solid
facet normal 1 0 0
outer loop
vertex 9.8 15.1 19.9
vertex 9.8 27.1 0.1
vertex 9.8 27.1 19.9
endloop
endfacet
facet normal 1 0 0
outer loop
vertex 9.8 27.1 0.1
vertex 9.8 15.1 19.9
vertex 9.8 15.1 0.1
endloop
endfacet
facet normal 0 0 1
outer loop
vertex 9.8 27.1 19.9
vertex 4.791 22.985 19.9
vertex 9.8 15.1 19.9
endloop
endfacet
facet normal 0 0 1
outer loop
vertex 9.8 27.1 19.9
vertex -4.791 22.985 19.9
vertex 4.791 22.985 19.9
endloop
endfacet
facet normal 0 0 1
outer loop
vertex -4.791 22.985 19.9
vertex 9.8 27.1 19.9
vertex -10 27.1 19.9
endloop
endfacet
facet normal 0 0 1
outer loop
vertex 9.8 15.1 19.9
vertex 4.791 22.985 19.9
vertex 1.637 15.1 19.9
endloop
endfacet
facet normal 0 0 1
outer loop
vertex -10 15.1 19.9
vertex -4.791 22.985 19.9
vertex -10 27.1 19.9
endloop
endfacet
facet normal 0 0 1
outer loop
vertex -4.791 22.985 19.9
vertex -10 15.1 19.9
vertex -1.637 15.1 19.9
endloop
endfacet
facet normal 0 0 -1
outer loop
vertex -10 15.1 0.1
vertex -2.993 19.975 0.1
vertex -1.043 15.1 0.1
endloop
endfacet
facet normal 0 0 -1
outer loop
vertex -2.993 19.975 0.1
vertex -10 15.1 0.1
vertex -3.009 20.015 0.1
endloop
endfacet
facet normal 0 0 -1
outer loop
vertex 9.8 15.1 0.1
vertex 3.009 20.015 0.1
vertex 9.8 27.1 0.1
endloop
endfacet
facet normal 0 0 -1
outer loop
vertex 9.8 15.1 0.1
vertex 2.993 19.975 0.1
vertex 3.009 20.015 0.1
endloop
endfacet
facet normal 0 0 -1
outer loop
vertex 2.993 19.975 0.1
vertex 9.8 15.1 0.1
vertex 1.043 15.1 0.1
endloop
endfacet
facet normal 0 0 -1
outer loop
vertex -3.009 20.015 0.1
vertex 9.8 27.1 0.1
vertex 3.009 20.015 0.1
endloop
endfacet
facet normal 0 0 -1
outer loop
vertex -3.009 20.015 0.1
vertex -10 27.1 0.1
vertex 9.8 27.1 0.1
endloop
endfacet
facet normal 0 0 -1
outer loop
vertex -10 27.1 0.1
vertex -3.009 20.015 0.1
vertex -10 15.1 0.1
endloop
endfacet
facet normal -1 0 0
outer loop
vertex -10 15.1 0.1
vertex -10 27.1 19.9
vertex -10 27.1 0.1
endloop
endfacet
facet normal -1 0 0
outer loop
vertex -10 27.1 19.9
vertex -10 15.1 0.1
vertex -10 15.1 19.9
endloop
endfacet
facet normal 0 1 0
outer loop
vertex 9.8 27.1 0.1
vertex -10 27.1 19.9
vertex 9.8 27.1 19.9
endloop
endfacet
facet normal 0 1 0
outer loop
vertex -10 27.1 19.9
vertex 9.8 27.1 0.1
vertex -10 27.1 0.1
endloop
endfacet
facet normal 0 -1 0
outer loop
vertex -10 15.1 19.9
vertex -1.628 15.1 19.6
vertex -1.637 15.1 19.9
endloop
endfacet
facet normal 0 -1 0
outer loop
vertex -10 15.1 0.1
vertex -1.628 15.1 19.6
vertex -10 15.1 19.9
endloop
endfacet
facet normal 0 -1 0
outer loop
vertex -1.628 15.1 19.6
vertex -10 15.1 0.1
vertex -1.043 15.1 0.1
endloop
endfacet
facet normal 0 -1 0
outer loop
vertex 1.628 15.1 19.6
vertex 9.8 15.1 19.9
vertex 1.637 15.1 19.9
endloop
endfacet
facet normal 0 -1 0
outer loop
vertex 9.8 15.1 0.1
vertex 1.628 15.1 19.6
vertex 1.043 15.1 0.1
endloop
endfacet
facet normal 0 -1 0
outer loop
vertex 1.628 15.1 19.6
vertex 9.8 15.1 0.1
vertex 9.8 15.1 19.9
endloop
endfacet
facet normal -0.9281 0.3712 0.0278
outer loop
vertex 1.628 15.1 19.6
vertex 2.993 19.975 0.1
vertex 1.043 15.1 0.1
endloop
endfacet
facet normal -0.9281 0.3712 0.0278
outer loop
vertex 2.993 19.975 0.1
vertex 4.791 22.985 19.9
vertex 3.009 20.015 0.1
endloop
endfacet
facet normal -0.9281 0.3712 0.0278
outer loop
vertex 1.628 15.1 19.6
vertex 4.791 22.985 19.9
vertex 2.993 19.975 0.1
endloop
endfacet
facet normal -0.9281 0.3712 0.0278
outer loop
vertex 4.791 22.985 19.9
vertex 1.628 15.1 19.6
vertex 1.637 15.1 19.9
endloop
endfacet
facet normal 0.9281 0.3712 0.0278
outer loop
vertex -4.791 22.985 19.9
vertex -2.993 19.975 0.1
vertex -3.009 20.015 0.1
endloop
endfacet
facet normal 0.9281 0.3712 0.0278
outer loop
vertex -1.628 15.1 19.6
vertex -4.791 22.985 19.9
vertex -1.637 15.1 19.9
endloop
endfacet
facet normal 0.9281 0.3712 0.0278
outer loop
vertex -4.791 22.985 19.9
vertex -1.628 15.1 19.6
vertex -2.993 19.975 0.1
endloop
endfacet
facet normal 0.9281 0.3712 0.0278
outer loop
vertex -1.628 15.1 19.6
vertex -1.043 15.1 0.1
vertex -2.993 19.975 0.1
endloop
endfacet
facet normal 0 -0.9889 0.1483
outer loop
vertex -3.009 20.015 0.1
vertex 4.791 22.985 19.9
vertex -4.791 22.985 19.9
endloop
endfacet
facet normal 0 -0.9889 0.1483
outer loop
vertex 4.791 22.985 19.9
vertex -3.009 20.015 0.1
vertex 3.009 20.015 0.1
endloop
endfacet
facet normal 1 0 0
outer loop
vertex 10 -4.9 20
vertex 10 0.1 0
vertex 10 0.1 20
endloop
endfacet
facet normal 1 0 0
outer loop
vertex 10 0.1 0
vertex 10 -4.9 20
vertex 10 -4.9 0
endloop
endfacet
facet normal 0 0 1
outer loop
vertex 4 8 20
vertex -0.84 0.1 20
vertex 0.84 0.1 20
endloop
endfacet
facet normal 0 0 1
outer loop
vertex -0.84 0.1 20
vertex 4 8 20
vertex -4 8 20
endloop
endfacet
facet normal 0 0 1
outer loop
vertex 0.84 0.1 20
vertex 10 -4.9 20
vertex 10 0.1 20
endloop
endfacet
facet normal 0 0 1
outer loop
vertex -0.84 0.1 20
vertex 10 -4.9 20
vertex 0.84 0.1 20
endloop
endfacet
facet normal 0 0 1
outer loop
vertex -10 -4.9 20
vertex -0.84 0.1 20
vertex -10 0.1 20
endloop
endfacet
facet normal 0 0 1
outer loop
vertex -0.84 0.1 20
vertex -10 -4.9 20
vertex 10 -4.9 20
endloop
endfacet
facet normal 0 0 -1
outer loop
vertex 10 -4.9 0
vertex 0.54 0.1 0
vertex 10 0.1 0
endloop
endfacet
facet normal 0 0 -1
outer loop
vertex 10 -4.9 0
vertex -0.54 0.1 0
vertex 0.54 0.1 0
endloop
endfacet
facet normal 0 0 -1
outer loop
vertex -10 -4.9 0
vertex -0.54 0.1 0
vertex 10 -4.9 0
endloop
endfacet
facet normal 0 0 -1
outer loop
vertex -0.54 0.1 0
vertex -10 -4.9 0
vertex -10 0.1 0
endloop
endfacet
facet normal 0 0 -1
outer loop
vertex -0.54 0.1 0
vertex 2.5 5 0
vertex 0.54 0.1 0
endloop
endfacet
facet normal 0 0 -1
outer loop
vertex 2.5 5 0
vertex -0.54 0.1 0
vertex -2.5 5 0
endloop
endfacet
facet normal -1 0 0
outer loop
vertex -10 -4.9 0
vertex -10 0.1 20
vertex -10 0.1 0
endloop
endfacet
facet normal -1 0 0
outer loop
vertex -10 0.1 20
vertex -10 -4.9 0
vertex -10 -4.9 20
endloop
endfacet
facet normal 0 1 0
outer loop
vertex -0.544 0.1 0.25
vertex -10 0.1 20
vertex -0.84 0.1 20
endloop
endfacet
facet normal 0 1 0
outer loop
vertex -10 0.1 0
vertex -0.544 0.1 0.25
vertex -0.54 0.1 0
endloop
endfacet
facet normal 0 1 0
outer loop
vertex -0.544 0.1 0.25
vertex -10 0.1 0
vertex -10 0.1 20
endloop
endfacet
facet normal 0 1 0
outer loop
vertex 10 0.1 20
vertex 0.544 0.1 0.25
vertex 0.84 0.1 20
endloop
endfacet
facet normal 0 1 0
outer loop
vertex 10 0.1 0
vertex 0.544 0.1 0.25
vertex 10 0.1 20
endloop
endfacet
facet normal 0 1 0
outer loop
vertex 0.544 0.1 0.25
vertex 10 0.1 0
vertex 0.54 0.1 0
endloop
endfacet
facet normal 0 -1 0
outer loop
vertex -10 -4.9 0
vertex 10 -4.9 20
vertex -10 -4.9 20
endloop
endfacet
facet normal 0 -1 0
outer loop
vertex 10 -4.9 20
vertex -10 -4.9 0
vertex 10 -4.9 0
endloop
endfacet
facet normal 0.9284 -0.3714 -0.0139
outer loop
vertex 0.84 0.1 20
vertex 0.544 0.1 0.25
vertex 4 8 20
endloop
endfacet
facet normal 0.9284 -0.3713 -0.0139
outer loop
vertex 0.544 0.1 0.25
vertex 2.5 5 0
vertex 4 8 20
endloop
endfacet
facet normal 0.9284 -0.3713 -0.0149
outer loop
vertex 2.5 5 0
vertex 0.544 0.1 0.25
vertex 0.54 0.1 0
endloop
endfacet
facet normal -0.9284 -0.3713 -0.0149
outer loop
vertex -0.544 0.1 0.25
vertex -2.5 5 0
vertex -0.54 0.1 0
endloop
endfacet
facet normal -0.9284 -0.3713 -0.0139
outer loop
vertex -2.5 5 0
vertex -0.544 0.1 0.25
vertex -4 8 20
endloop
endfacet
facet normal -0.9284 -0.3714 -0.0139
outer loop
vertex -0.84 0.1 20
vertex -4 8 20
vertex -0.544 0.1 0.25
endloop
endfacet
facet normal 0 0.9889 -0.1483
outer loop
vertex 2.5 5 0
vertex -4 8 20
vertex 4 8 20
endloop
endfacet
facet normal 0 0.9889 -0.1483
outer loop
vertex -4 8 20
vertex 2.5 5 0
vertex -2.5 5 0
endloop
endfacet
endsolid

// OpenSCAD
// file: joiner.scad
/*
snippet DOC

= Joiner

A geometric shape that can be used as a positive on one piece and a negative on the other and these two parts can be joined together to form a new shape.
This can provide a removable connection between two pieces.

The actual structure looks like the following:

image::joiner-1.png[]

The base of the joiner is a paralellogramma.
The parallel sides of the paralellogramma are `neck` and `shoulder`.
The neck is the narrower (smaller value) and the shoulder is the wider (larger value).

The vertical size of the structure is `height`.

[source,scad]
----
{%@snip code%}
----

When using 3D printing there is a small epsilon value to be added to the structures.
This epsilon value makes the shape sink into the other shape and also make the negative counterpart a bit smaller.
If the eplison offset is the same for bot of the shapes then the two shapes will fit together perfectly.

No.translateThey will not due to the fact that the 3D printer is not perfect and the two shapes will not fit together perfectly.

The angle of the paralellogramma at the bottom is the same as at the top, thereore the two sides are parallel.

end snippet
*/

// snippet code
module joiner(neck, shoulder, depth, height, scale=1.2) {

    leftOut = [- neck / 2, 0];
    rightOut = [neck / 2, 0];
    leftIn = [- shoulder / 2, depth];
    rightIn = [shoulder / 2, depth];
    linear_extrude(height = height, scale = scale)
        polygon(points = [leftOut, rightOut, rightIn, leftIn]);
}
// end snippet
// main file
include <joiner.scad>

h = 20;
depth = 5;
epsilon = 0.1;

translate([0, 15, 0])
    difference() {
        translate([- h / 2, + epsilon, epsilon])
            cube([h - 2 * epsilon, 12, h - 2 * epsilon]);
        joiner(2, 6, depth, h, 1.6);
    }

translate([- h / 2, - 5 + epsilon, 0])
    cube([h, 5, h]);
joiner(1, 5, depth, h, 1.6);
